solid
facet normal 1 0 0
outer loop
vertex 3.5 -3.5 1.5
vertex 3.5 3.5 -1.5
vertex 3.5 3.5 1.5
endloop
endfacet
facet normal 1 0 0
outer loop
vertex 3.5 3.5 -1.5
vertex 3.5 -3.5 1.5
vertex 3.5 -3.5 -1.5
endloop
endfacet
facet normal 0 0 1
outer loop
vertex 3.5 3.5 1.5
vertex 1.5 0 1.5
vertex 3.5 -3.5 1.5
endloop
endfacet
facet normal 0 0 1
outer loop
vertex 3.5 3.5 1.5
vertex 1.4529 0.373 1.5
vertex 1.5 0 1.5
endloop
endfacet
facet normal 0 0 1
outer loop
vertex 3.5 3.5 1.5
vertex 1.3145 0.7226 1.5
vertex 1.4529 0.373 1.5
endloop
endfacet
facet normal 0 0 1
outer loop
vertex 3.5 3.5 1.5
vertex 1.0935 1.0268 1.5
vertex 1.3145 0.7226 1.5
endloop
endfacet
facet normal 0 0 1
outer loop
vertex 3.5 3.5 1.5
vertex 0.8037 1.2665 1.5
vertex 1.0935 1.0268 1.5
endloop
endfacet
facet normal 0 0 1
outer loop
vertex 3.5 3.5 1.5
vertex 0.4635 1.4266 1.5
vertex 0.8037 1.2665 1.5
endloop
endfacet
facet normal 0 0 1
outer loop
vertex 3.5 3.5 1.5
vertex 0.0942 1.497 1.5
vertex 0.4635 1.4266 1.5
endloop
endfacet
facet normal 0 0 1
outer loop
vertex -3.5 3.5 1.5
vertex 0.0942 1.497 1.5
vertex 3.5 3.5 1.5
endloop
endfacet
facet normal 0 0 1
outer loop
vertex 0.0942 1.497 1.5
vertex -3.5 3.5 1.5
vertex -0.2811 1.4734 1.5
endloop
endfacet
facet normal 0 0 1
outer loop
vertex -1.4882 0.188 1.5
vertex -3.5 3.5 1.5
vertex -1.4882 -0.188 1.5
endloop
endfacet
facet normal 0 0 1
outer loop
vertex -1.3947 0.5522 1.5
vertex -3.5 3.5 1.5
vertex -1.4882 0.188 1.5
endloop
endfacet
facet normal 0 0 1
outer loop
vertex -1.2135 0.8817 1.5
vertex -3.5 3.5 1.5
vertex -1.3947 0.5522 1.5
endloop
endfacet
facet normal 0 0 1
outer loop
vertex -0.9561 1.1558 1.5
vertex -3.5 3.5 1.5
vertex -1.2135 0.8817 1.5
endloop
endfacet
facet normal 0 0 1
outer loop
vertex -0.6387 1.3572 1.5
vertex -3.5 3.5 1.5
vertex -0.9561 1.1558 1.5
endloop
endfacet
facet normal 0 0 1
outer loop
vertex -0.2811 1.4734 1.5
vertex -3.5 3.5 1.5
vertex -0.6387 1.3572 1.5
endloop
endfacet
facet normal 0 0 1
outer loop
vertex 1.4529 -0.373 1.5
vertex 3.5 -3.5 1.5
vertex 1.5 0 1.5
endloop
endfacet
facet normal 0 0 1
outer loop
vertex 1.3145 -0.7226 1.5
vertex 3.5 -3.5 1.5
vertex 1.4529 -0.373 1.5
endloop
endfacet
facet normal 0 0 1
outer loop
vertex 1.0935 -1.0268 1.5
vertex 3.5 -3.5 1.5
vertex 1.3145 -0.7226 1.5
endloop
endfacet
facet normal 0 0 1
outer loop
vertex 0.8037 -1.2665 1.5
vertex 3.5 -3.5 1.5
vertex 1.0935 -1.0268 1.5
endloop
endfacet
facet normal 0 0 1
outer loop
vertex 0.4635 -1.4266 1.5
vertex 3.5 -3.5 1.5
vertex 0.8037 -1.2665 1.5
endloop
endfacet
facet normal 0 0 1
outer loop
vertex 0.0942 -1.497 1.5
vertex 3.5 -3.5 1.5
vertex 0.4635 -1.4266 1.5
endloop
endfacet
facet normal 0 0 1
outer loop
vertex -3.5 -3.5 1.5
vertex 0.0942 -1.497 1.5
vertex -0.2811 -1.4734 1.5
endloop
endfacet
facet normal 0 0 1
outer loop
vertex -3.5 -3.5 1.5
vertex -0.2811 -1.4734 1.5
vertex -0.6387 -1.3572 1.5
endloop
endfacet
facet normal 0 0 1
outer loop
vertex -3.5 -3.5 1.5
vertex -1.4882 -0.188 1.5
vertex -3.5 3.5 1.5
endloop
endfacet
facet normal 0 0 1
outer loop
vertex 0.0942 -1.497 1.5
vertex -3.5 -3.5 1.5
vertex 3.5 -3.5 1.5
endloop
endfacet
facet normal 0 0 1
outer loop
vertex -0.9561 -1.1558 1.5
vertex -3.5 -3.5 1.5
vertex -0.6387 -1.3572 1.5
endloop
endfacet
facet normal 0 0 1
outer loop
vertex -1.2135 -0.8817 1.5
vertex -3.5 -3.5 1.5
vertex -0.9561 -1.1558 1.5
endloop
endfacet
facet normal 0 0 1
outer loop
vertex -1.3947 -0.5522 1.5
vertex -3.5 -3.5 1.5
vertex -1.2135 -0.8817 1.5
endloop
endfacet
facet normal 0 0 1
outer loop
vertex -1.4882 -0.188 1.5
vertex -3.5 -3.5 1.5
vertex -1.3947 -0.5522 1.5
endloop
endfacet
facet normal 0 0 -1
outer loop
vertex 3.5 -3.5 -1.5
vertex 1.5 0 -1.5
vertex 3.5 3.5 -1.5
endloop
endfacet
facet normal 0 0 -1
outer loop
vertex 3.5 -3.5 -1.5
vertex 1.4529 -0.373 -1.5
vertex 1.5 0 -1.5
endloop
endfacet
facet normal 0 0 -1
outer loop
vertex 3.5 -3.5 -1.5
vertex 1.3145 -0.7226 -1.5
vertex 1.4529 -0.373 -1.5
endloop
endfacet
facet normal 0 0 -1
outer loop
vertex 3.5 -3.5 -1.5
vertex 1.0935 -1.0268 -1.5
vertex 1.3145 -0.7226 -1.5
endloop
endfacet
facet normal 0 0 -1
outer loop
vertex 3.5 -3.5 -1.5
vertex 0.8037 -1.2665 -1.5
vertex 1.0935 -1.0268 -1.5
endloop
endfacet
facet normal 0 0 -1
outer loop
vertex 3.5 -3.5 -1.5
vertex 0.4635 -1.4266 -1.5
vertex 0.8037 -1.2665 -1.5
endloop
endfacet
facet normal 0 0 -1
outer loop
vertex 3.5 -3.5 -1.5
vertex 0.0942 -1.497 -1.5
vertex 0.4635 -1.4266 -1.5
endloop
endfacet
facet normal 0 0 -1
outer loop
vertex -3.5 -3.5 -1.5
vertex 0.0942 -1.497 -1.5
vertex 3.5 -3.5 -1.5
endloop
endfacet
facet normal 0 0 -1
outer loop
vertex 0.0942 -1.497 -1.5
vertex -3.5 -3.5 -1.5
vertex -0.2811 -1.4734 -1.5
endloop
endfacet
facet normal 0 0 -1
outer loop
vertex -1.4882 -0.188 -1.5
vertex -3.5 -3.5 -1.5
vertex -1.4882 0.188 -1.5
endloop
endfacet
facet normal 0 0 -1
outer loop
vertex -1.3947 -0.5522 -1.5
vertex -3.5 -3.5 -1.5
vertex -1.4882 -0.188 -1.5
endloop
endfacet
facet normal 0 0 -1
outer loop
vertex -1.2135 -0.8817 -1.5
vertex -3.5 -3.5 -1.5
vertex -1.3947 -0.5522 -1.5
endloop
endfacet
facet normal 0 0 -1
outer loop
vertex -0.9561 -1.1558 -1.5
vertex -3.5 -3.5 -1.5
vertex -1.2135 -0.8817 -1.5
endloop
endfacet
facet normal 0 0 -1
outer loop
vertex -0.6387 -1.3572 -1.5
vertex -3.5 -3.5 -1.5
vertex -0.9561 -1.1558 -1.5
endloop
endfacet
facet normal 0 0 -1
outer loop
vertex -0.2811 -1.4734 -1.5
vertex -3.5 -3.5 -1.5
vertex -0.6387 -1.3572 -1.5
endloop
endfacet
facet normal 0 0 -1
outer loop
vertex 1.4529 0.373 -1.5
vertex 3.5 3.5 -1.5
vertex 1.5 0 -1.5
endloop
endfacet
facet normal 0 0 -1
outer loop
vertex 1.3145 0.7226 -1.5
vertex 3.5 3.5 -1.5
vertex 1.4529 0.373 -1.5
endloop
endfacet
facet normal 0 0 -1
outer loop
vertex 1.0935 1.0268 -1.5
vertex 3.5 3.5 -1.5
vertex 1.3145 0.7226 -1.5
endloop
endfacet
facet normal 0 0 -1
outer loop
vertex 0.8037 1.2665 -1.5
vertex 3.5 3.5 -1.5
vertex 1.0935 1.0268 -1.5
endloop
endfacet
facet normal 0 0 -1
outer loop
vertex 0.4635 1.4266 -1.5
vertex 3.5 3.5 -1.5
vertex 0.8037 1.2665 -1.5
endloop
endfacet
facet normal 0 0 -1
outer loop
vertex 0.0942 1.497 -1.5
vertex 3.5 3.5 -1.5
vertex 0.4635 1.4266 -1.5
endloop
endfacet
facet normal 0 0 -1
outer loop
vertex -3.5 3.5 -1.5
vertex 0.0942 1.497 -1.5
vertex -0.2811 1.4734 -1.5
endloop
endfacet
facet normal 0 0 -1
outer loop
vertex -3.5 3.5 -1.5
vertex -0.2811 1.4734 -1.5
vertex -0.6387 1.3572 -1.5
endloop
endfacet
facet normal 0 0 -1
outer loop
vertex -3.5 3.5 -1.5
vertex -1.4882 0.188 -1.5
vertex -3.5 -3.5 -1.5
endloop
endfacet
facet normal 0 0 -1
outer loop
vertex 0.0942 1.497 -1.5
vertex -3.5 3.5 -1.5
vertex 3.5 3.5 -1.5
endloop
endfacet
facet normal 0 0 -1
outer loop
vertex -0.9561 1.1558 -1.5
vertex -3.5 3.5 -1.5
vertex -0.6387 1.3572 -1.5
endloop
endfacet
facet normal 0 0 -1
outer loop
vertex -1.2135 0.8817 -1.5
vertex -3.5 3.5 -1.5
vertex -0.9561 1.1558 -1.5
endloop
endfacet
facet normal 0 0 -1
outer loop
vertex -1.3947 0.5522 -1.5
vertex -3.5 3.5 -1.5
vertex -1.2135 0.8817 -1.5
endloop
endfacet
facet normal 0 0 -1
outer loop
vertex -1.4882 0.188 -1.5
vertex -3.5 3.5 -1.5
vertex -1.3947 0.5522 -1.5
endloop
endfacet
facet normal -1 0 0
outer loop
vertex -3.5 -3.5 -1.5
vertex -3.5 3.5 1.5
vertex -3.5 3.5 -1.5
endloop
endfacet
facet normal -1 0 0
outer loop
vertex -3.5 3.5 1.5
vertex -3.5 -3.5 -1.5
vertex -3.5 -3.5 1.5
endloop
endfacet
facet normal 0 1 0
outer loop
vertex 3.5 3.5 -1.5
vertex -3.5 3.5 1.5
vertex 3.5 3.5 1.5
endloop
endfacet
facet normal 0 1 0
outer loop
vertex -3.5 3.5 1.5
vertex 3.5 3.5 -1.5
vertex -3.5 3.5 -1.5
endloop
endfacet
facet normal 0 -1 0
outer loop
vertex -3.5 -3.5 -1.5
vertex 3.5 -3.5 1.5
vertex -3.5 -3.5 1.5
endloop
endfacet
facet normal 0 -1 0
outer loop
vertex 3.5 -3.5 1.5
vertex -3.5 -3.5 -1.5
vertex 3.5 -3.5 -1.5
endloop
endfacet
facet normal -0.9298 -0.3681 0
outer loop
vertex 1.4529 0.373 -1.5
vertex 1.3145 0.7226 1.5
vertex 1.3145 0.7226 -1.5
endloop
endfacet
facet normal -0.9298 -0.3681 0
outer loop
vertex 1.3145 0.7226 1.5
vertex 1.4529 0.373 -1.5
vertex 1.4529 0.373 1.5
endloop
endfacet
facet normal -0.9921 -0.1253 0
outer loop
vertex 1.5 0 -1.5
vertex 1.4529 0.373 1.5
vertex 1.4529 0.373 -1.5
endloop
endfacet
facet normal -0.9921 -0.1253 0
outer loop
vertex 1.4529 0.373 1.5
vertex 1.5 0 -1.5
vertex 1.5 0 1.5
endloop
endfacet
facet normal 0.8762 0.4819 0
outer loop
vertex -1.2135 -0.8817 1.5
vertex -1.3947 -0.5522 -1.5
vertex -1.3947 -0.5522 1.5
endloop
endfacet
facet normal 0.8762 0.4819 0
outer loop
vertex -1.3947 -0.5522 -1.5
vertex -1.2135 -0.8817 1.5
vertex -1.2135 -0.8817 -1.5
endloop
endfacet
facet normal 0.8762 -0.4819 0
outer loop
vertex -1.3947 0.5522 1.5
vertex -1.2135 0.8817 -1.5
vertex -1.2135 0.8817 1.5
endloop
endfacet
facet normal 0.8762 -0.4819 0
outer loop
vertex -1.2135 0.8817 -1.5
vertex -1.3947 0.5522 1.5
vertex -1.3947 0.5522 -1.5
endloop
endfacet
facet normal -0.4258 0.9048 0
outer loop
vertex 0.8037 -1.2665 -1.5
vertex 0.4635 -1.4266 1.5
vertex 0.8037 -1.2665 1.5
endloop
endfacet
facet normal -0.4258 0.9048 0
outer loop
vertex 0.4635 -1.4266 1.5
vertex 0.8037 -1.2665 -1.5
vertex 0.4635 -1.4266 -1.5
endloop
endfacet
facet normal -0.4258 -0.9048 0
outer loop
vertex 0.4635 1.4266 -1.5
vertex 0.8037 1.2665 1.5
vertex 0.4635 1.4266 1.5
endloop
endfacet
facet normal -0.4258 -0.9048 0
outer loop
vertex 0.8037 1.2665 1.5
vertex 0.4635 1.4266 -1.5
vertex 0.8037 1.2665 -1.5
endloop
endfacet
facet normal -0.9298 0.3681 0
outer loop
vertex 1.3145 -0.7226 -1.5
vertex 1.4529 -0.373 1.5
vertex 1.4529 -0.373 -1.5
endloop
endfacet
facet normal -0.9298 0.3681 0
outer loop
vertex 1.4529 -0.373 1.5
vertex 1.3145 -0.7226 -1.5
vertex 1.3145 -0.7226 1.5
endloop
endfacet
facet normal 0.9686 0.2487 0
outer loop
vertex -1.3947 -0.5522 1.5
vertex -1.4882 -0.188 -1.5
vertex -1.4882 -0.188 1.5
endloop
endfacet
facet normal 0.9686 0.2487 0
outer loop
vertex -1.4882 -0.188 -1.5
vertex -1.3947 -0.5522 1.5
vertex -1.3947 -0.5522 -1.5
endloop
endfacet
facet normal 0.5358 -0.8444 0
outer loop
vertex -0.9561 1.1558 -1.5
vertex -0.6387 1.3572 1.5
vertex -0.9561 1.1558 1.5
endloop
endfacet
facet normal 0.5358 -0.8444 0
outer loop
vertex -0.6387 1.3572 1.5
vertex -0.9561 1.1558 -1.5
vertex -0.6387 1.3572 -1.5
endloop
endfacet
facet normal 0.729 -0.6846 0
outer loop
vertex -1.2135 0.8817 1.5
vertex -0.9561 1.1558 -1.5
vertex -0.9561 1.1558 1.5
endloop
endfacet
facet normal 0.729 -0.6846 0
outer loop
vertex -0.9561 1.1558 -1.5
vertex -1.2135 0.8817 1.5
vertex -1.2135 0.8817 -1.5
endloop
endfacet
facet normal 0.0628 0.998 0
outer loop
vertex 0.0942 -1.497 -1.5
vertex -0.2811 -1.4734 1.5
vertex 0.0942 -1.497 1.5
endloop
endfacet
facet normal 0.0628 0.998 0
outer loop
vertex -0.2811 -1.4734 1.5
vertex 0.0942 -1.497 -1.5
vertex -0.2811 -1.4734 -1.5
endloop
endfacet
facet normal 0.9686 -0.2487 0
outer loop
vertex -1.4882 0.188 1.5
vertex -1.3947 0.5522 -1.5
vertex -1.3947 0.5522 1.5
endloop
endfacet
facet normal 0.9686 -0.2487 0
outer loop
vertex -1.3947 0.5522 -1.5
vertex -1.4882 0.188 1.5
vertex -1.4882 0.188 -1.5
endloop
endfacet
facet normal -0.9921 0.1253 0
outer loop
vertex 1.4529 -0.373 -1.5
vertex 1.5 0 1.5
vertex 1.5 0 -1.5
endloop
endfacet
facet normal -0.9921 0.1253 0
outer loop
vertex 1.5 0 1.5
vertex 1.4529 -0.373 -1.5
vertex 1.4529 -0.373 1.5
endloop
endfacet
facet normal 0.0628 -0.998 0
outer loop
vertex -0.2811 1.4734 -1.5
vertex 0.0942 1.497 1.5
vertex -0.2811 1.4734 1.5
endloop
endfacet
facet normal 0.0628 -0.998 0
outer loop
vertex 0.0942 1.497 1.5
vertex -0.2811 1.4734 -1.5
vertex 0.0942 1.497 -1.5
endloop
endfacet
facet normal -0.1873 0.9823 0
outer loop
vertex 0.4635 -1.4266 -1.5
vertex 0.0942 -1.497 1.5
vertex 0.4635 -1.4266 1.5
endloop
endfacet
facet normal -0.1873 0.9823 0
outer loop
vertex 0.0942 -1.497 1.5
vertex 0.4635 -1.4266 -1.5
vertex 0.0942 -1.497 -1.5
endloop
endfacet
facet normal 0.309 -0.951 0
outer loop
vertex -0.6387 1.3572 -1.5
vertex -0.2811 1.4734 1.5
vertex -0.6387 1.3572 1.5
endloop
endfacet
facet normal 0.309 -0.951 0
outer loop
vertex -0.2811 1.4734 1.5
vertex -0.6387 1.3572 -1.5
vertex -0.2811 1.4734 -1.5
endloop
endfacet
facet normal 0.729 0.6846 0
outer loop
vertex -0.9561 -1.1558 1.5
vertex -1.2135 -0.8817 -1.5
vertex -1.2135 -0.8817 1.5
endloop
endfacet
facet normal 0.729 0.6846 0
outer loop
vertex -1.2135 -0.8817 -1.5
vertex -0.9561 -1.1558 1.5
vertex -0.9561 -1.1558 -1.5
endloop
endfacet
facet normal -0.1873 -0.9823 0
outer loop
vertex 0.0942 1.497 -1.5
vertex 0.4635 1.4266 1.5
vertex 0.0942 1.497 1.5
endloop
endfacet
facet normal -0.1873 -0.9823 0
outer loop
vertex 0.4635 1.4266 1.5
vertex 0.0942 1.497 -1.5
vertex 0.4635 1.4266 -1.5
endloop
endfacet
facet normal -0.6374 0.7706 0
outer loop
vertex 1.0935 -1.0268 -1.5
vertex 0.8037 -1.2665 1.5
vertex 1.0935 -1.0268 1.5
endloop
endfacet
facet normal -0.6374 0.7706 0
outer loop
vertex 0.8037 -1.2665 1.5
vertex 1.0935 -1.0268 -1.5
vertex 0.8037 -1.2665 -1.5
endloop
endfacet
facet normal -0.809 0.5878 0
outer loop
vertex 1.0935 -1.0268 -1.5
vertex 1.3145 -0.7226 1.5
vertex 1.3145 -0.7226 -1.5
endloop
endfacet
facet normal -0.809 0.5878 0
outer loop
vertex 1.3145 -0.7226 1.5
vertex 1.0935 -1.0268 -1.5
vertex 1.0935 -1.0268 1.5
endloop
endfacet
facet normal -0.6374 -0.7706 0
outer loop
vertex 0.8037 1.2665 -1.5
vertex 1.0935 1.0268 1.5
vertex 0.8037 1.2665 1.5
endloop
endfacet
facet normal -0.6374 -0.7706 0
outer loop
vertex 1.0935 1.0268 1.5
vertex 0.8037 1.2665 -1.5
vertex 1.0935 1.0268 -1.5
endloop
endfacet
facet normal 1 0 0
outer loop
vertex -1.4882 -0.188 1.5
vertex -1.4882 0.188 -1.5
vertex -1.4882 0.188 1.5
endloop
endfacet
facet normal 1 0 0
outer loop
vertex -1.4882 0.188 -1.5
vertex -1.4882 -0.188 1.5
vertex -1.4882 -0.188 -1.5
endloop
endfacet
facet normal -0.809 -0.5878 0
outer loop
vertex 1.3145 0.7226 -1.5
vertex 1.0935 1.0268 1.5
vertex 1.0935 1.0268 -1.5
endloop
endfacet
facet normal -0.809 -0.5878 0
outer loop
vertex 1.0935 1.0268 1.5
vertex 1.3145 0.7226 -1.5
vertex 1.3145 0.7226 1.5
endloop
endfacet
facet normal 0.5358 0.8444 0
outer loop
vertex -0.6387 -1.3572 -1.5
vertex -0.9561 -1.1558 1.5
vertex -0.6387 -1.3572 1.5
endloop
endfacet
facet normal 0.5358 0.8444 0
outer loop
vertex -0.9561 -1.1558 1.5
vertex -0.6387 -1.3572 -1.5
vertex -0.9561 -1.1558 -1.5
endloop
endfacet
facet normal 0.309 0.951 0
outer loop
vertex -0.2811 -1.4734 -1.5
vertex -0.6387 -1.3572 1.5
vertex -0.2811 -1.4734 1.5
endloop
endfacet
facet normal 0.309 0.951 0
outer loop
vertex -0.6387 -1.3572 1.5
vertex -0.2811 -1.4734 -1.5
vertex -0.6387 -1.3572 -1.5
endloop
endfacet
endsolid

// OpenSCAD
difference()
{    
    cube([7,7,3],center=true);
    cylinder(d=3,h=8,$fn=25,center=true);    
}   
